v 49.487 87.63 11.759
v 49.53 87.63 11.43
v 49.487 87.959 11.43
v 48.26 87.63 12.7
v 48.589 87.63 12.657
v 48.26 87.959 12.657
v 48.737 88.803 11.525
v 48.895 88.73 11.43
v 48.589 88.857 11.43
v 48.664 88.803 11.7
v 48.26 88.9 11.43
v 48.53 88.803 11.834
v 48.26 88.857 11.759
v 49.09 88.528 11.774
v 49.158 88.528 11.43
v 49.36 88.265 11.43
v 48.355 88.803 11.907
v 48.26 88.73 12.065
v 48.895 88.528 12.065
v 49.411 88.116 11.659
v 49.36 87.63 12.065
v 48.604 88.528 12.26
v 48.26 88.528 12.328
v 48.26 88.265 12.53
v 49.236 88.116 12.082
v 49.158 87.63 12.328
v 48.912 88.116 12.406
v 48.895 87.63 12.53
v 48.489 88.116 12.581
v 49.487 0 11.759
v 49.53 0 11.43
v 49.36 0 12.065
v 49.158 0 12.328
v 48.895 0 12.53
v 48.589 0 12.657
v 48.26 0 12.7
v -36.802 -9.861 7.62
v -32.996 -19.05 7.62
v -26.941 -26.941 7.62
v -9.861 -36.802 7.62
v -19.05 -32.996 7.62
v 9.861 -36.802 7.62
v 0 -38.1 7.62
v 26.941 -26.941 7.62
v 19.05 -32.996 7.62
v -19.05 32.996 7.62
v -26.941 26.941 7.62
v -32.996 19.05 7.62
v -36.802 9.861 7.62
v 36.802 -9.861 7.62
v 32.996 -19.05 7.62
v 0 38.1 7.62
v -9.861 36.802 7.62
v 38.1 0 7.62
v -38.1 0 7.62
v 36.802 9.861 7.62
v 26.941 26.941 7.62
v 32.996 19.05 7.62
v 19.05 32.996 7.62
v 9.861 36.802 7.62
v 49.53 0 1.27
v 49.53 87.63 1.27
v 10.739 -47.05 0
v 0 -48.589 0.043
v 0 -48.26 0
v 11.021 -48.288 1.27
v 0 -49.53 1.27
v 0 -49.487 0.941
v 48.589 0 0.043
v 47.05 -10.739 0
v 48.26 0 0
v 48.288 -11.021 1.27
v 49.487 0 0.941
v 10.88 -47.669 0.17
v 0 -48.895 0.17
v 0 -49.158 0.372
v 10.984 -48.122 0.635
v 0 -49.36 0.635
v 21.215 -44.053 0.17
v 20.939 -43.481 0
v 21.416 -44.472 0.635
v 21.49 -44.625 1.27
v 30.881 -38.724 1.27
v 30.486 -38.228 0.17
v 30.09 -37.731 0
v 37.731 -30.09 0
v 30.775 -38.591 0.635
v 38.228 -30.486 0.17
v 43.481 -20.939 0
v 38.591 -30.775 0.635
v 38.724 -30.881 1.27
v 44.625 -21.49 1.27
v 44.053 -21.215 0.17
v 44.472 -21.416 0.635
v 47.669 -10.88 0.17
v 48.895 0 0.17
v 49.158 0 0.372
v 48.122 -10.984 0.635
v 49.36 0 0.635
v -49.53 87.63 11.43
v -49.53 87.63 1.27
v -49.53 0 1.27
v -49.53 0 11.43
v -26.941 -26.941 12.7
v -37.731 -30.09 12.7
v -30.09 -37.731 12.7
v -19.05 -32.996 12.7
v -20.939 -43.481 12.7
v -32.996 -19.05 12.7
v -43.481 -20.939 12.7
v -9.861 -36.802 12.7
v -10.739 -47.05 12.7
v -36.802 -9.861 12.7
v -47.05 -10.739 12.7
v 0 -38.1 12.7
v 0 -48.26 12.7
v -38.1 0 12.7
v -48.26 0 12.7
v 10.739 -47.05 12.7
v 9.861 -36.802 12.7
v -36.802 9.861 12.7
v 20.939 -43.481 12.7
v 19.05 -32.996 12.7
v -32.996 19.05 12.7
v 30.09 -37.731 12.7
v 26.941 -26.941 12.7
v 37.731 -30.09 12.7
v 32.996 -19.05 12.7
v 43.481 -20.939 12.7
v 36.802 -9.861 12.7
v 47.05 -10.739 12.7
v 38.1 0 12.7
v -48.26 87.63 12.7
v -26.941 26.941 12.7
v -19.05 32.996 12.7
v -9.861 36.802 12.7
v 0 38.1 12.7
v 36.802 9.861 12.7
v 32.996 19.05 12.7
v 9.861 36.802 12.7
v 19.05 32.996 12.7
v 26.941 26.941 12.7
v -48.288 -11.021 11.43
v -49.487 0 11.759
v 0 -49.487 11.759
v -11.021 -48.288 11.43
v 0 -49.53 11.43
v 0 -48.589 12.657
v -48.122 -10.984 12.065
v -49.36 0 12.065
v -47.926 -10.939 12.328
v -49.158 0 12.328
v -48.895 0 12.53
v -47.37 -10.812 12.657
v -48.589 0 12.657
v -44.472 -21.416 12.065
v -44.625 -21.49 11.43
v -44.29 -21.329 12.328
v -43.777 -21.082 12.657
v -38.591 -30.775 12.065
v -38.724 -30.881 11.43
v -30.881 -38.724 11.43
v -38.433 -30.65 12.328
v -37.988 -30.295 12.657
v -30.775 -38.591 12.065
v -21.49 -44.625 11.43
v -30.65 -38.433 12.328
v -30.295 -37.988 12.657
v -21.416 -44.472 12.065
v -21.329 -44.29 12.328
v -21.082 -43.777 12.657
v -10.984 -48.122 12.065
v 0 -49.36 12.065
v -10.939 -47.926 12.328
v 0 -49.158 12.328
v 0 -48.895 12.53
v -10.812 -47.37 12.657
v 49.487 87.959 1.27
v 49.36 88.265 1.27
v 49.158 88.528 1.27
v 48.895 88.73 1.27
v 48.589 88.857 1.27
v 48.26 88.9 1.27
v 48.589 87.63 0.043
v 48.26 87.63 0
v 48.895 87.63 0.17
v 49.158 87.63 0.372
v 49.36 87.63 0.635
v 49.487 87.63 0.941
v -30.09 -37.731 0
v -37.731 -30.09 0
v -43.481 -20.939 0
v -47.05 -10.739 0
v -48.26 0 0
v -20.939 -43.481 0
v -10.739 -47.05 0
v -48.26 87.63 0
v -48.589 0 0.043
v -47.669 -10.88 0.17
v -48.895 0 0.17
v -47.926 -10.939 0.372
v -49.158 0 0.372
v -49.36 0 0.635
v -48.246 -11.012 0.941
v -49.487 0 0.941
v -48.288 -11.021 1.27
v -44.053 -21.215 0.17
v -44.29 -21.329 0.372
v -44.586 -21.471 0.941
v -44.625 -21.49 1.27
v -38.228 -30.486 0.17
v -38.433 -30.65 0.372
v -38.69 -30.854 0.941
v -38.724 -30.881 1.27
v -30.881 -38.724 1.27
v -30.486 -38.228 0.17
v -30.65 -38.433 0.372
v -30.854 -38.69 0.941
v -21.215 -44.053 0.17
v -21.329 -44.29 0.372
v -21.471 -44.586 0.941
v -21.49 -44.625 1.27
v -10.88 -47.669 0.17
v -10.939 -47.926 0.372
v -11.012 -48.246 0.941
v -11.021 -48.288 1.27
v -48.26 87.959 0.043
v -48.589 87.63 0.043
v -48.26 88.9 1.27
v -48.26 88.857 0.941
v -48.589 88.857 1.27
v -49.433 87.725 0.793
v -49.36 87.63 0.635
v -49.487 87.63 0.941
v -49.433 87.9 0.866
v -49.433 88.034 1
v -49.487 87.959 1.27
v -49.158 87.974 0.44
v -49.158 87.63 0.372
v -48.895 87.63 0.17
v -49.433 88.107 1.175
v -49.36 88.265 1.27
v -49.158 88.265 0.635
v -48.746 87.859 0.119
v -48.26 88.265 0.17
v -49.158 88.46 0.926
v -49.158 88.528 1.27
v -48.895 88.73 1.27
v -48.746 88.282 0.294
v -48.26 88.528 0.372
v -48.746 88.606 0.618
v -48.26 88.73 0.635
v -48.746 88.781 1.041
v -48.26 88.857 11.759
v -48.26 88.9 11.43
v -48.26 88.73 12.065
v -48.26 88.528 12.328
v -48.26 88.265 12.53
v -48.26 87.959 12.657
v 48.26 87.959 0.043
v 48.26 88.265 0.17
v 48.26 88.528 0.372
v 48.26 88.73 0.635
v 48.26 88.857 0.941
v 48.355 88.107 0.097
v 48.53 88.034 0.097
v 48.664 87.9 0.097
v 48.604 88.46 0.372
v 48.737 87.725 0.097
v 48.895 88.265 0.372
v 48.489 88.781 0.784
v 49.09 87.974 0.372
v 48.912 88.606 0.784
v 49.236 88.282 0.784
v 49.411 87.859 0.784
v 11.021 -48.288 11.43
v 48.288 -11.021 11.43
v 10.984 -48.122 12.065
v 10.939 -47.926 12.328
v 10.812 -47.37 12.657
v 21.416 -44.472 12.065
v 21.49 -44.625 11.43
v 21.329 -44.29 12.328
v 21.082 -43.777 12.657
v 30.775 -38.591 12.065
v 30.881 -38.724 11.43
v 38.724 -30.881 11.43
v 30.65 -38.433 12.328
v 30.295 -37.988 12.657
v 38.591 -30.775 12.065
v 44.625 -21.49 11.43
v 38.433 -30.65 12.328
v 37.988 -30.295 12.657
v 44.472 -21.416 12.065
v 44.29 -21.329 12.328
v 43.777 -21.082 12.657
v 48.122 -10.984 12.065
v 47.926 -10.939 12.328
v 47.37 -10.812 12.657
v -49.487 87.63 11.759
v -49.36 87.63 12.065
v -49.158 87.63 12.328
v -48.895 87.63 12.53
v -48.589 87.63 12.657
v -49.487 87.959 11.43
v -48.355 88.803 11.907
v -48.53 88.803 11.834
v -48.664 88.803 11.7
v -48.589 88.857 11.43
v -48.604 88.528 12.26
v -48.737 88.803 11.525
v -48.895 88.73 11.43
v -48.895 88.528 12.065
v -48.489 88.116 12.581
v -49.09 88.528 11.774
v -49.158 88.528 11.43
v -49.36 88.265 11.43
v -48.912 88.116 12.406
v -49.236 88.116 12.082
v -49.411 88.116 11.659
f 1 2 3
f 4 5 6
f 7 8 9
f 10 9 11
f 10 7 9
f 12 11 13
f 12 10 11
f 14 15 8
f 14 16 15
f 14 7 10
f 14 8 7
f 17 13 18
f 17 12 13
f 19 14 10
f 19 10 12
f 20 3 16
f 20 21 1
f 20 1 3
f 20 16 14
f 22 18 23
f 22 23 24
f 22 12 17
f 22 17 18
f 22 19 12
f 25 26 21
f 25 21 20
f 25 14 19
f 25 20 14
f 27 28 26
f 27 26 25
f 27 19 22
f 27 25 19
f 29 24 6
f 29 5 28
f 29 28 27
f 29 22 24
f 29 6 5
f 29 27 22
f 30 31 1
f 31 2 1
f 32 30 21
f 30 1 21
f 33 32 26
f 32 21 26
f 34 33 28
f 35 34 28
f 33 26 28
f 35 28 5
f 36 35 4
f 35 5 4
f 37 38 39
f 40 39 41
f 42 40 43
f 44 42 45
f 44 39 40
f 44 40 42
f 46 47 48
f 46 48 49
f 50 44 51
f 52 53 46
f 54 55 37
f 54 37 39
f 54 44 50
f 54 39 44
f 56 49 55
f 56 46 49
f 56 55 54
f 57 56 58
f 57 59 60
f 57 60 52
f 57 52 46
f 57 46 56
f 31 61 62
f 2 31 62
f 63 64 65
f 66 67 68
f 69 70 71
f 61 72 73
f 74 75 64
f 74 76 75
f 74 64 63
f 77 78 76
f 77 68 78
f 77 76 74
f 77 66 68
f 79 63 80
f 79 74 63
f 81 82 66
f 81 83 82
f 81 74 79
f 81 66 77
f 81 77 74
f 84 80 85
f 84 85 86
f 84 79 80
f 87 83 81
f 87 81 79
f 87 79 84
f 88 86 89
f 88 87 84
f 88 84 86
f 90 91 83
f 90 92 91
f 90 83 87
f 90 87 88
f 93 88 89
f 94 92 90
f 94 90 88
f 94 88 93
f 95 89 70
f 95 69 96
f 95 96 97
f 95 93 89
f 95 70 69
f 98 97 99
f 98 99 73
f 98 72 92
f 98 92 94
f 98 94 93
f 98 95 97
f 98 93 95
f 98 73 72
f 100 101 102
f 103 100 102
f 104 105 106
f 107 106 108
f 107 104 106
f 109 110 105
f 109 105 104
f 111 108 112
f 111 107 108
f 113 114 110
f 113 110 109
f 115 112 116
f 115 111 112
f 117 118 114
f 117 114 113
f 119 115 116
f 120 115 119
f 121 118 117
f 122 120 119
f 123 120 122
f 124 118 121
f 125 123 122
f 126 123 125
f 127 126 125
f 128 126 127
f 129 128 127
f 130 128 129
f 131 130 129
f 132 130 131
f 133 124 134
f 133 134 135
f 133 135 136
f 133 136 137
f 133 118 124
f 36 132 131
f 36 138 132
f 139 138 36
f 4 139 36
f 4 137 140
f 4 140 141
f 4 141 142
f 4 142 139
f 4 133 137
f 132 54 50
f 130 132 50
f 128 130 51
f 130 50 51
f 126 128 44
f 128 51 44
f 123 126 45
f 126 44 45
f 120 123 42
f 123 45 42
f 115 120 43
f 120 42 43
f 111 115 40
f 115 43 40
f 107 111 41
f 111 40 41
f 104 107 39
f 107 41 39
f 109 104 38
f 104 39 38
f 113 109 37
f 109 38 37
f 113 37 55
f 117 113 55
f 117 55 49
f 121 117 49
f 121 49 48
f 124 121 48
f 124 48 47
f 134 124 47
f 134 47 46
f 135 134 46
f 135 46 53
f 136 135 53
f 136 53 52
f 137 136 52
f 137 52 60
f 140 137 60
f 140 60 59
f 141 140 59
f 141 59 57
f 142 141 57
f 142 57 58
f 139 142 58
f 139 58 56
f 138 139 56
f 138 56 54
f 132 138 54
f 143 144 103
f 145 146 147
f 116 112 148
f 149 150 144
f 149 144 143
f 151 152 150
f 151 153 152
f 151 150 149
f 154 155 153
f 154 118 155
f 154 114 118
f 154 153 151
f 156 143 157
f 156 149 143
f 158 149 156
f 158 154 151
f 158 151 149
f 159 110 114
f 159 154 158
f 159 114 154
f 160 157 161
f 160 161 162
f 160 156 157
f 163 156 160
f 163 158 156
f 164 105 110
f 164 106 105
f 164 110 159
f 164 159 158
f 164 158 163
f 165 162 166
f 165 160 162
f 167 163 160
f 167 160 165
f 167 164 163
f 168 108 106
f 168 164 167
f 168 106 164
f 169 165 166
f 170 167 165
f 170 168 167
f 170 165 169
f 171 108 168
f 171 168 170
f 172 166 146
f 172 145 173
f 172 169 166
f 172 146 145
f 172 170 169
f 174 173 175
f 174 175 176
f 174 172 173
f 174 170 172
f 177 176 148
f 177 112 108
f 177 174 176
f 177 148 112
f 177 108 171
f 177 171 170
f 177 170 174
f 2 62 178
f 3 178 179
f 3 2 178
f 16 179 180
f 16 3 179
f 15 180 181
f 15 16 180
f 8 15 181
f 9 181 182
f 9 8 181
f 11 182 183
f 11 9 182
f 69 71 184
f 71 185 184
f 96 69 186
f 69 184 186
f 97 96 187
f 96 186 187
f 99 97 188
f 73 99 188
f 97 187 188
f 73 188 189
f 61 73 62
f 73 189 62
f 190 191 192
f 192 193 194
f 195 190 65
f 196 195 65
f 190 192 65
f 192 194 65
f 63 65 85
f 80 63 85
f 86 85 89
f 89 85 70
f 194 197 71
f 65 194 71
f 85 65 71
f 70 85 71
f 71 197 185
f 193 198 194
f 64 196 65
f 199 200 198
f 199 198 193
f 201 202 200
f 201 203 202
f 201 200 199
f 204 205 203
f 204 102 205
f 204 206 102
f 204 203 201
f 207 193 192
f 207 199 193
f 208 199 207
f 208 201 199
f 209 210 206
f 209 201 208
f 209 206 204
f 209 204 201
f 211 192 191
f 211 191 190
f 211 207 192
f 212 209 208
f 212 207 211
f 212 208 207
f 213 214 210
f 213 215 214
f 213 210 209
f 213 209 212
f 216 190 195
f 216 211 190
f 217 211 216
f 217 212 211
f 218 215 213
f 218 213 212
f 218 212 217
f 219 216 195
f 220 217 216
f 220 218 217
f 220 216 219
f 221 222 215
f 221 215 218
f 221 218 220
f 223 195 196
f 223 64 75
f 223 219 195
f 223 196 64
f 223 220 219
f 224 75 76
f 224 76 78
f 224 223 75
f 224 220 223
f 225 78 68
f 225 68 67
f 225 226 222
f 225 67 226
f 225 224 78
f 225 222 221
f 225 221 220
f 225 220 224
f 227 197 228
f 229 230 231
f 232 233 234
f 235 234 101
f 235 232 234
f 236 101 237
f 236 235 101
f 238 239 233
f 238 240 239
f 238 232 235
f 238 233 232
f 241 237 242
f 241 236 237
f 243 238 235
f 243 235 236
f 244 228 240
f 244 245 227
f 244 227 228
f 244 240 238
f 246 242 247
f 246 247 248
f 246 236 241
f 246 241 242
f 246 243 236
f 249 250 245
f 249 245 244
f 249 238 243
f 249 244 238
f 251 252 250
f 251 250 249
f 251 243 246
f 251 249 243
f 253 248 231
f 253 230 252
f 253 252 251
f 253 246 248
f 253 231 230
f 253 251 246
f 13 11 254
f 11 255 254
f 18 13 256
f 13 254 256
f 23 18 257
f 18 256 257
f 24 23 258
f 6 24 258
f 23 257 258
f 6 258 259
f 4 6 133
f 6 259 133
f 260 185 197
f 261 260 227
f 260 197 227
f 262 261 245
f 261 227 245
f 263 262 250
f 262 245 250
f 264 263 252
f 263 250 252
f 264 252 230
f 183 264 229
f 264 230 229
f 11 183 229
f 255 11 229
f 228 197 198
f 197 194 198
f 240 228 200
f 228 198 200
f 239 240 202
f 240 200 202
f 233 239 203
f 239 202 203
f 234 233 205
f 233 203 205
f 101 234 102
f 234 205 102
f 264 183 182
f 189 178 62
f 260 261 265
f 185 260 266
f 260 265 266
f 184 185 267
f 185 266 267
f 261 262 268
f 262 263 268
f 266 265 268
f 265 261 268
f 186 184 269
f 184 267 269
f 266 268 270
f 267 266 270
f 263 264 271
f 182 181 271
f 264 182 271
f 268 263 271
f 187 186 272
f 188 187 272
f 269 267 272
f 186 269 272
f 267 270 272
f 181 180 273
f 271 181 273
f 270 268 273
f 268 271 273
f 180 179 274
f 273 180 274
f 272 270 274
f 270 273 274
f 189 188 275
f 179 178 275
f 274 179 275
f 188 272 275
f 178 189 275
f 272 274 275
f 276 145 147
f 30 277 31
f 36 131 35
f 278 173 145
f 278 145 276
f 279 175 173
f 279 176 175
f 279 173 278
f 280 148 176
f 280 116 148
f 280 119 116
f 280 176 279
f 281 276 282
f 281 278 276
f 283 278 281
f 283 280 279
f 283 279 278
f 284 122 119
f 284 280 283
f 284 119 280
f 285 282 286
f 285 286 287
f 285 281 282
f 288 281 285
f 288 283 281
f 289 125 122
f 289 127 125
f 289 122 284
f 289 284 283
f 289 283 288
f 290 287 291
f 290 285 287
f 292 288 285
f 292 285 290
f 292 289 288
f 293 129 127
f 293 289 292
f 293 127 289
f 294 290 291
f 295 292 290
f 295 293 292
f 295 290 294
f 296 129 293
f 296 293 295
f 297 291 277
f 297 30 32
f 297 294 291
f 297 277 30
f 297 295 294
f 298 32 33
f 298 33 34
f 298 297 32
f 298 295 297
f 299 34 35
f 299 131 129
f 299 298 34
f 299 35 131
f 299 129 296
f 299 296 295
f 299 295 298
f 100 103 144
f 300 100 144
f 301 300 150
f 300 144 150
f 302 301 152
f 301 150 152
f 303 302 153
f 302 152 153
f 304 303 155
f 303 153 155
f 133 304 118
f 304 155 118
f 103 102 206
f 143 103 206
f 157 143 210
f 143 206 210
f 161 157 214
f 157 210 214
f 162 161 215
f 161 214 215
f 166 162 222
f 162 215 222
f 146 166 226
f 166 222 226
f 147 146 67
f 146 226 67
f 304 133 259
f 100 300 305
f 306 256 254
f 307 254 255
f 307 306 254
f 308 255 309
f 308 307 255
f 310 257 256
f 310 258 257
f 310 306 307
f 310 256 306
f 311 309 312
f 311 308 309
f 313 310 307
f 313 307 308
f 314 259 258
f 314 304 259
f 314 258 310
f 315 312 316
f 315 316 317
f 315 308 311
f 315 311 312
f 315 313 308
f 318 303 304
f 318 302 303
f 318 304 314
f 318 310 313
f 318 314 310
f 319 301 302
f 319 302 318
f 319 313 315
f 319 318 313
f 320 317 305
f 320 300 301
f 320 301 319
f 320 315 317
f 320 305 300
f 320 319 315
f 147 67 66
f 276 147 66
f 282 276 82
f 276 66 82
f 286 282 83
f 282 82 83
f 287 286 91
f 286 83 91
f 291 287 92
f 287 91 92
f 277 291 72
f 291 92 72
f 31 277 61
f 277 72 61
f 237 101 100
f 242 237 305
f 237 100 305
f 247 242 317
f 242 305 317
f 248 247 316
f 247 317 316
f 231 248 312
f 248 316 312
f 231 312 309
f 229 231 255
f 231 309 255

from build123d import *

# Parameters (mm, degrees)
F1_DEPTH = 12.7
F2_DEPTH = 7.62
F3_R     = 1.27


with BuildPart() as f1:
    # F0 (on Top) → F1 (new body)
    with BuildSketch(Plane.XY):
        with BuildLine():
            Line((-49.53, 88.9), (-49.53, 0))
            ThreePointArc((-49.53, 0), (-35.0229988722, -35.0229988722), (0, -49.53))
            Line((0, -49.53), (0, -38.1))
            ThreePointArc((0, -38.1), (-38.1, 0), (0, 38.1))
            Line((0, 38.1), (0, 88.9))
            Line((0, 88.9), (-49.53, 88.9))
        make_face()
        with BuildLine():
            Line((0, -38.1), (0, -49.53))
            ThreePointArc((0, -49.53), (35.0229988722, -35.0229988722), (49.53, 0))
            Line((49.53, 0), (49.53, 88.9))
            Line((49.53, 88.9), (0, 88.9))
            Line((0, 88.9), (0, 38.1))
            ThreePointArc((0, 38.1), (26.9407683632, 26.9407683632), (38.1, 0))
            ThreePointArc((38.1, 0), (26.9407683632, -26.9407683632), (0, -38.1))
        make_face()
    extrude(amount=F1_DEPTH)

    # F0 (on Top) → F2 (join)
    with BuildSketch(Plane.XY):
        with BuildLine():
            ThreePointArc((0, 38.1), (-38.1, 0), (0, -38.1))
            Line((0, -38.1), (0, 38.1))
        make_face()
        with BuildLine():
            Line((0, 38.1), (0, -38.1))
            ThreePointArc((0, -38.1), (26.9407683632, -26.9407683632), (38.1, 0))
            ThreePointArc((38.1, 0), (26.9407683632, 26.9407683632), (0, 38.1))
        make_face()
    extrude(amount=F2_DEPTH)

    # F3
    f3_edges = [f1.edges().sort_by_distance(p)[0] for p in [
        (49.53, 44.45, 12.7),
        (49.53, 88.9, 6.35),
        (0, 88.9, 12.7),
        (0, 88.9, 0),
        (49.53, 44.45, 0),
        (-49.53, 88.9, 6.35),
    ]]
    fillet(f3_edges, radius=F3_R)


solid = f1.part
